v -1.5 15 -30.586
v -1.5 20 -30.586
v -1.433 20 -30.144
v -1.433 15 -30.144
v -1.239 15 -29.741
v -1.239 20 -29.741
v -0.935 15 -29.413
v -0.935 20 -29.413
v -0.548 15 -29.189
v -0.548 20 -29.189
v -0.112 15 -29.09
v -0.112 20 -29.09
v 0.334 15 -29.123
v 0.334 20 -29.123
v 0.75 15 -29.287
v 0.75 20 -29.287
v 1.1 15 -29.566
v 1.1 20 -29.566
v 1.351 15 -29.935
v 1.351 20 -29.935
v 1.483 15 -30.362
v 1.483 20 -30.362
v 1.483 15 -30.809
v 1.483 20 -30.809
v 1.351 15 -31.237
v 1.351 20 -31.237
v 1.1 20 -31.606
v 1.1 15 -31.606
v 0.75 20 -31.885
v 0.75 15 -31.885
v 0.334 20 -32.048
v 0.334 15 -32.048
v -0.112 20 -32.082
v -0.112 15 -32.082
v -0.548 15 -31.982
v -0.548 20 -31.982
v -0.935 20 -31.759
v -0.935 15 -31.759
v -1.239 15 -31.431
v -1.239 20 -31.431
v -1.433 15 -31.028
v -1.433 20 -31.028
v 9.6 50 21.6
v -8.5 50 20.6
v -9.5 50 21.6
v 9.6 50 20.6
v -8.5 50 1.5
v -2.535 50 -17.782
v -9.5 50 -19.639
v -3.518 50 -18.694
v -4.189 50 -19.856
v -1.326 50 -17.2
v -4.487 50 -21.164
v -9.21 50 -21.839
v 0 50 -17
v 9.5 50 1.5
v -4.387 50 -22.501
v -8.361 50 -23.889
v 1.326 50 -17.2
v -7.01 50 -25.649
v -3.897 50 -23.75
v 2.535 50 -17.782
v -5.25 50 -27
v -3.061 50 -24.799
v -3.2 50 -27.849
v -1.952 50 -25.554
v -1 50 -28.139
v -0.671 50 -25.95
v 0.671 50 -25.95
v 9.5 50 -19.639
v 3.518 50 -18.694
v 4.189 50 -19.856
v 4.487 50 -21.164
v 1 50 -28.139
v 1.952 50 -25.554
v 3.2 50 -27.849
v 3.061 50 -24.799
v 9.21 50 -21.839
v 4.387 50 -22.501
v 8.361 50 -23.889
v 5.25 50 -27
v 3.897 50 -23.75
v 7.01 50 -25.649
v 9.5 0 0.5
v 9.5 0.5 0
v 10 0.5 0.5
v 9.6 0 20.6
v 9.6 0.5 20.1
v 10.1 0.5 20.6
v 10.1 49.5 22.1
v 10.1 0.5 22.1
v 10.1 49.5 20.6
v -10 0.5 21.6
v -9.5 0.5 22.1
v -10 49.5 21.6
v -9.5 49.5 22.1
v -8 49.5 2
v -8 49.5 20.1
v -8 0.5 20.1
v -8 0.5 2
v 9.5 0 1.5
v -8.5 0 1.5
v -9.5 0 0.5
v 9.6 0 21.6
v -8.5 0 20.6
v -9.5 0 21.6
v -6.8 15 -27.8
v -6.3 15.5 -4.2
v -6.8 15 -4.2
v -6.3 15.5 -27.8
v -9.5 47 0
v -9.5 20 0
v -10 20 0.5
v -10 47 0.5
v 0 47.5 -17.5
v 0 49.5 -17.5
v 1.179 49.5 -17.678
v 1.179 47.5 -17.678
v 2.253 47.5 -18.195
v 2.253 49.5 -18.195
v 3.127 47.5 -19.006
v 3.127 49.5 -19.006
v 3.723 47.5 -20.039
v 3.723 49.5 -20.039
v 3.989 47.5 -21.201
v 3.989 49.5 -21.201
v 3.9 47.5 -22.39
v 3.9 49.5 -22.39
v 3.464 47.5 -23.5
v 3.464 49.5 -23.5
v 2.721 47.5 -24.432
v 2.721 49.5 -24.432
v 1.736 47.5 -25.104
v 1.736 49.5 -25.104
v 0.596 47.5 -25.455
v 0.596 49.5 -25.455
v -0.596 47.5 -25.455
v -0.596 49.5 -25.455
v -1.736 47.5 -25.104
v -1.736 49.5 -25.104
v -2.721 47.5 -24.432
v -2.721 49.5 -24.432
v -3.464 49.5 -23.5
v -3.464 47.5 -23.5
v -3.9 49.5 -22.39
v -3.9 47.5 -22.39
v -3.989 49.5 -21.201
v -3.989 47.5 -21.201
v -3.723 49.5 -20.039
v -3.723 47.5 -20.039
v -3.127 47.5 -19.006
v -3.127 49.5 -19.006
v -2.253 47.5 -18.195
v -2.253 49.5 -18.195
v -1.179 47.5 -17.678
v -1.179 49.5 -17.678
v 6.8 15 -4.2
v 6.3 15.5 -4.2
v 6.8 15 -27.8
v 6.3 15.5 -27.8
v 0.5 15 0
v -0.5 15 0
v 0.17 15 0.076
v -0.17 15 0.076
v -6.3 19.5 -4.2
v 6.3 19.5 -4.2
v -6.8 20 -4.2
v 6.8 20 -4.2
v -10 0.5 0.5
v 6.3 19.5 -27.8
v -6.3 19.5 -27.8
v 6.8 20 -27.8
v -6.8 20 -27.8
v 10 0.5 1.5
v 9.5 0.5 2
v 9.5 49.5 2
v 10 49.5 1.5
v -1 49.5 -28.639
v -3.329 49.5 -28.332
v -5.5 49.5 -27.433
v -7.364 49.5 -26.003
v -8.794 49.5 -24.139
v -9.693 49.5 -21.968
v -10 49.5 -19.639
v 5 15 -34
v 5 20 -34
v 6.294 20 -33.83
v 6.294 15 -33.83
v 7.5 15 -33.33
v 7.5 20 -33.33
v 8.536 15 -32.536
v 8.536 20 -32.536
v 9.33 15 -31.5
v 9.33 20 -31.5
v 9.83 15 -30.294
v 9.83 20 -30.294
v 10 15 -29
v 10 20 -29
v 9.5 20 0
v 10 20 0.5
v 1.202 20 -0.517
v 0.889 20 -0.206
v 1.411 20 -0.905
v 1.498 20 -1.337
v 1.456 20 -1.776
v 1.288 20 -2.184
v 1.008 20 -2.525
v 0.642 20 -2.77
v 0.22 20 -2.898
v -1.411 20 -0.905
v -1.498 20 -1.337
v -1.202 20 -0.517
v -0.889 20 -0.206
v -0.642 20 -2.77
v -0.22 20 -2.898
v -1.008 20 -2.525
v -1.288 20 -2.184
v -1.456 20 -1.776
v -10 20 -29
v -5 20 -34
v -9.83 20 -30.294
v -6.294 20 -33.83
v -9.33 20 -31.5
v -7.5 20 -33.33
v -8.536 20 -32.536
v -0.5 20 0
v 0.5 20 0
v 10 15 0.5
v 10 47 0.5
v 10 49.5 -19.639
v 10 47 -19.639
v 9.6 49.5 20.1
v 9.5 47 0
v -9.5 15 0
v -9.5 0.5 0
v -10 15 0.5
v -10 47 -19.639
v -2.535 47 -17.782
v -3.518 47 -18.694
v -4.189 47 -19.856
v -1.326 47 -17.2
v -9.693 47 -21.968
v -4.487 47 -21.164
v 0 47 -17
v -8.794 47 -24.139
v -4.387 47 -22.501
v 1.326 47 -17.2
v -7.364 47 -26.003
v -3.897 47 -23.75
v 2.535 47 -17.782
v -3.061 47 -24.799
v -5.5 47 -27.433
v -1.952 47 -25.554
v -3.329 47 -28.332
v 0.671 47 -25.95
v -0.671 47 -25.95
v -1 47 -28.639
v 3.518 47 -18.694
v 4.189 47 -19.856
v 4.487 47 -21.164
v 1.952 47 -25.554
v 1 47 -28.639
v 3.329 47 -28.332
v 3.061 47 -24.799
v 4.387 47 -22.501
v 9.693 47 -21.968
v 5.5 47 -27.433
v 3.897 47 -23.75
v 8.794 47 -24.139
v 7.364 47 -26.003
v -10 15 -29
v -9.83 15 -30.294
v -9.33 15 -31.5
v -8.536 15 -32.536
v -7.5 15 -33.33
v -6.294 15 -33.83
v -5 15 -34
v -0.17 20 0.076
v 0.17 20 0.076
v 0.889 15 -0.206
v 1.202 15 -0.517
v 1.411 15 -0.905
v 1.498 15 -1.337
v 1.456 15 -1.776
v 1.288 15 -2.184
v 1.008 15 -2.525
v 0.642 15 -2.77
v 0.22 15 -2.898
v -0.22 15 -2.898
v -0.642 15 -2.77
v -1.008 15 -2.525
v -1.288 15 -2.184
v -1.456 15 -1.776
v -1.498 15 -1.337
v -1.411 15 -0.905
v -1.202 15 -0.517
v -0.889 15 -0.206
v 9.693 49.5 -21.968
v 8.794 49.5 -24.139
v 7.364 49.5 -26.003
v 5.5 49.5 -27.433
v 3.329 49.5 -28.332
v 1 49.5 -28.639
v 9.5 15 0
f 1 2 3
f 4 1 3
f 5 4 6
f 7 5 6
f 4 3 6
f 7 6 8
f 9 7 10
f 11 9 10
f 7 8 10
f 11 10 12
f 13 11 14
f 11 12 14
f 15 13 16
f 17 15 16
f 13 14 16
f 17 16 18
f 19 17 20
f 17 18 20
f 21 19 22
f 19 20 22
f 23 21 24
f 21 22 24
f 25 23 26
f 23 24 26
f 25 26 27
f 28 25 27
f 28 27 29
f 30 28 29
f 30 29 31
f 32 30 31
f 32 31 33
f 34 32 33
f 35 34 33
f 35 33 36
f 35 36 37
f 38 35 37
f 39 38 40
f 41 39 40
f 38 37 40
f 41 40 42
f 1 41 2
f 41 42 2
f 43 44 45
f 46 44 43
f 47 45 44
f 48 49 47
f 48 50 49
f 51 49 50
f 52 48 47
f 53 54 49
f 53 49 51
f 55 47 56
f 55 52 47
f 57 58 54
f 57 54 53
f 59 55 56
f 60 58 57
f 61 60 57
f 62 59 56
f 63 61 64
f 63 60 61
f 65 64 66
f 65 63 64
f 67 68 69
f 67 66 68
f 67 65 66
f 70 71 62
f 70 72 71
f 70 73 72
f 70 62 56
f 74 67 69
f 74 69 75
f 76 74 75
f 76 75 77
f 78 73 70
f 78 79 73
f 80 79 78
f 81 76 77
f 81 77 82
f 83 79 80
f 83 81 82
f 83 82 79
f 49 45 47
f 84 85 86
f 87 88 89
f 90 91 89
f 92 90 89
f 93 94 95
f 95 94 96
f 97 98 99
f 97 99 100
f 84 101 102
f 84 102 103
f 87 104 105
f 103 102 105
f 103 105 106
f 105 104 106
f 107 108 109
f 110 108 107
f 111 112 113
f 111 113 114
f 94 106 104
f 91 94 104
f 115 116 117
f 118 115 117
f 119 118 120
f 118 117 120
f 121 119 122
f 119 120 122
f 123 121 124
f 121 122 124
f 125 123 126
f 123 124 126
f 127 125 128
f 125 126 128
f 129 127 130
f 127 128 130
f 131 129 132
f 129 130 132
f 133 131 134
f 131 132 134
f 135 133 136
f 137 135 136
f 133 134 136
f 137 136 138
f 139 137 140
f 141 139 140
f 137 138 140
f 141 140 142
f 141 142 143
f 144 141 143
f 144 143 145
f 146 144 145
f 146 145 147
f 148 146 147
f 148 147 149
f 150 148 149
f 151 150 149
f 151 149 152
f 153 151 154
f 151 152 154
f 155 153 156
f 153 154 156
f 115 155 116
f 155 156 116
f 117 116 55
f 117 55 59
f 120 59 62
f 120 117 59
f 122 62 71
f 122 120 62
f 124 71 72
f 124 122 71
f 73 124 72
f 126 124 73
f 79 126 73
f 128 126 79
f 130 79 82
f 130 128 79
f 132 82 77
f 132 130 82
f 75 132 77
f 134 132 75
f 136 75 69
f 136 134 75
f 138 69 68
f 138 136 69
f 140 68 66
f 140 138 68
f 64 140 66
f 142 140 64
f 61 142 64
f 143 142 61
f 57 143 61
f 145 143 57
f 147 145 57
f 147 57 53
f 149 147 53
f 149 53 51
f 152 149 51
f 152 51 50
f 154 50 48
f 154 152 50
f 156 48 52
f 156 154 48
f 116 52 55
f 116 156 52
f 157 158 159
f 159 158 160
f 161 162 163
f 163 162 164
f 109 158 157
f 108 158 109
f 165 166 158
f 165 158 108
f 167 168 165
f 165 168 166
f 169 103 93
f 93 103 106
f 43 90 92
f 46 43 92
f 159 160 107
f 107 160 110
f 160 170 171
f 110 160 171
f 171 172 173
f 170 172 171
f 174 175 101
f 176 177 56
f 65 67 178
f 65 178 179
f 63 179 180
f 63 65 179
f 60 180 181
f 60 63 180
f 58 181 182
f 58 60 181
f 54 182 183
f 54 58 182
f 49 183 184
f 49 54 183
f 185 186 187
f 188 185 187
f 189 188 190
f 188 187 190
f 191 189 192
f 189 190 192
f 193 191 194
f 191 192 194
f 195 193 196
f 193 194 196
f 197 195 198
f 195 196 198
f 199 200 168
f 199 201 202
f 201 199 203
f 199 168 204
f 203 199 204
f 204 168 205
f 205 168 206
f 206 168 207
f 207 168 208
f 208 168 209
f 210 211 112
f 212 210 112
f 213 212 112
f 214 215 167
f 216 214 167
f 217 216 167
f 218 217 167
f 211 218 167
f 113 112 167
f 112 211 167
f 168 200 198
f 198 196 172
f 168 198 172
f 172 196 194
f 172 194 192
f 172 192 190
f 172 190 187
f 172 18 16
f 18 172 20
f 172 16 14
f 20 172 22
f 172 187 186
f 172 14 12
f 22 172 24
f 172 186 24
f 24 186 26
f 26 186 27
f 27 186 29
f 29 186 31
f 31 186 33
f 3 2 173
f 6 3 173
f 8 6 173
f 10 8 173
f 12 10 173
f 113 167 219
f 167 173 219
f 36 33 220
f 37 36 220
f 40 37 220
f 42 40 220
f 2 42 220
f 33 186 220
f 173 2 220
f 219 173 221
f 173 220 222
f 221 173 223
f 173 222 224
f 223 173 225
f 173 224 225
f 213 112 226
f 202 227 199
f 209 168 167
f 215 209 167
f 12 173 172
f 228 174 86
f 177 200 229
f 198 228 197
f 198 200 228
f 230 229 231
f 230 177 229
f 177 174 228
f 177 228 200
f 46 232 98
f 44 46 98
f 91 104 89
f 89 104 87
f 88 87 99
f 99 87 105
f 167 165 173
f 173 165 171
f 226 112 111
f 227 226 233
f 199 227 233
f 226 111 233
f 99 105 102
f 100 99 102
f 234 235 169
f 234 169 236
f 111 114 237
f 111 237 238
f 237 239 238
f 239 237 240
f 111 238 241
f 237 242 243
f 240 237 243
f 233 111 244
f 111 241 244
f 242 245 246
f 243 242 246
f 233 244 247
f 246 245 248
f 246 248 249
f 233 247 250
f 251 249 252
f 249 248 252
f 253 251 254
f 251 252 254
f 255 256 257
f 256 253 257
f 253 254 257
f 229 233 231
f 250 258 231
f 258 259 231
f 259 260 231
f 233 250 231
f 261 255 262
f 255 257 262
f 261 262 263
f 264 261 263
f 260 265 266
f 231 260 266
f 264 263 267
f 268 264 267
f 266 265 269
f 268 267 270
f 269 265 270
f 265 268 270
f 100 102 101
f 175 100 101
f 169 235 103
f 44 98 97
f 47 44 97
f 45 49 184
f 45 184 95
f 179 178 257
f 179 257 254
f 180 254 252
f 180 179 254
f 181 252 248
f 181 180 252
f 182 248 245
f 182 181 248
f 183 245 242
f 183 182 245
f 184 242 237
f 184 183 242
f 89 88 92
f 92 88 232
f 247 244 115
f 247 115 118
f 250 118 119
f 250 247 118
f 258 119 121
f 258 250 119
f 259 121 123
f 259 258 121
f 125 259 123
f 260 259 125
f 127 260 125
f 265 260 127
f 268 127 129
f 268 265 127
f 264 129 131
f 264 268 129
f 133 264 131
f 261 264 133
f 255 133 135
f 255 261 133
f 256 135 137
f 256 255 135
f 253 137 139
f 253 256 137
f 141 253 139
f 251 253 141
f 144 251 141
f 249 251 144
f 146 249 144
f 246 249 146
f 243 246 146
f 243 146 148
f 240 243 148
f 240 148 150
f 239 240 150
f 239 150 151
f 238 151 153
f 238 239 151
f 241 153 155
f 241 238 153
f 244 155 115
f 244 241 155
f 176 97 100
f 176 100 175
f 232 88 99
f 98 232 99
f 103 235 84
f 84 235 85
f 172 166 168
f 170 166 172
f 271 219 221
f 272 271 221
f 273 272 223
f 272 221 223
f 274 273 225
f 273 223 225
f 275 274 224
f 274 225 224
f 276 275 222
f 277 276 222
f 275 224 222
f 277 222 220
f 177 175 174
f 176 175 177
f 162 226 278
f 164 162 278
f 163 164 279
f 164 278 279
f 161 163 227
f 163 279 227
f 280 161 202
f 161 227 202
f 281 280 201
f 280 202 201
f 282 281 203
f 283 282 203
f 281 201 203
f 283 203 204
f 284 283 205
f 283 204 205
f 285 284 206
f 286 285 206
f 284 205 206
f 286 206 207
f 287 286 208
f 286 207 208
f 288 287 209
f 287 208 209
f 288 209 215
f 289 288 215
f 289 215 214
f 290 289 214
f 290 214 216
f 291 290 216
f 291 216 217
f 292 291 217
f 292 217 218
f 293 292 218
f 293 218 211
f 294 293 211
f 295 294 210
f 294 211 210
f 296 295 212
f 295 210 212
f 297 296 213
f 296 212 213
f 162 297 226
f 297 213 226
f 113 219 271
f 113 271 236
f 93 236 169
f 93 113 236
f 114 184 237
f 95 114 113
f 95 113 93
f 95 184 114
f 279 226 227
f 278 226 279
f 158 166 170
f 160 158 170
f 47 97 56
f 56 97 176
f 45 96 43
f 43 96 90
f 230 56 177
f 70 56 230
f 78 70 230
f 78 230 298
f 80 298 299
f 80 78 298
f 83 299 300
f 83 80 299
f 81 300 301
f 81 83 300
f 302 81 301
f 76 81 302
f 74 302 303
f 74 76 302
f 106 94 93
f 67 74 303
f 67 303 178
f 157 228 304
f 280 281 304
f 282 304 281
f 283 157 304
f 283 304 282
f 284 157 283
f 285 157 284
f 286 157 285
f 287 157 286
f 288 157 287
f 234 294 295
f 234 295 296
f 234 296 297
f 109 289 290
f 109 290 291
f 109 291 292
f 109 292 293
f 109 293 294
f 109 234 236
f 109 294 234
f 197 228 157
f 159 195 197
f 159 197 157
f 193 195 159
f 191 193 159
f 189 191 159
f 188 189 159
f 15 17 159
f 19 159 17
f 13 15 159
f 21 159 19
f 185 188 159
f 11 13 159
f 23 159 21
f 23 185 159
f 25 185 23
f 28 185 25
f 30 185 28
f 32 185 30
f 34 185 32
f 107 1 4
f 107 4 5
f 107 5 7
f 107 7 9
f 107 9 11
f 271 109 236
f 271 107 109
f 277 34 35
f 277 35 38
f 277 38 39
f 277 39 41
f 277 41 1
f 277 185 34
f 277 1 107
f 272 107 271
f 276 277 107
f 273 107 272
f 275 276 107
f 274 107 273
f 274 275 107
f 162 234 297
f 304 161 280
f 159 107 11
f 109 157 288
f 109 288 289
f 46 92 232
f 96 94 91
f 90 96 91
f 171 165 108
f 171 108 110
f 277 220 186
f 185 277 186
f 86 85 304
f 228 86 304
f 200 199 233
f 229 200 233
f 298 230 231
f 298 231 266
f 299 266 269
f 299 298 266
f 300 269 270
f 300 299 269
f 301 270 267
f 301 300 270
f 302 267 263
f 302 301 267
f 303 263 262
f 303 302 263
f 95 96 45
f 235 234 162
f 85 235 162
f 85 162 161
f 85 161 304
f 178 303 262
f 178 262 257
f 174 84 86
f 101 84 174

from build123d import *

# Parameters (mm, degrees)
SKETCH1_W           = 20
SKETCH1_H           = 50
BOSS_EXTRUDE1_DEPTH = 2
BOSS_EXTRUDE2_DEPTH = 50
SKETCH3_R           = 4
BOSS_EXTRUDE3_DEPTH = 3
SKETCH4_W           = 12.6
SKETCH4_H           = 23.6
BOSS_EXTRUDE4_DEPTH = 5
CHAMFER1_SIZE       = 0.5
CHAMFER2_SIZE       = 0.5
SKETCH5_R           = 1.5
CUT_EXTRUDE1_DEPTH  = 5


with BuildPart() as part:
    # Sketch1 → Boss-Extrude1 (new body)
    with BuildSketch(Plane.XY):
        with Locations((0, 25)):
            Rectangle(SKETCH1_W, SKETCH1_H)
    extrude(amount=BOSS_EXTRUDE1_DEPTH)

    # Sketch2 → Boss-Extrude2 (add)
    with BuildSketch(Plane.XZ):
        Polygon((-10, 2), (-10, 22.1), (10.1, 22.1), (10.1, 20.1), (-8, 20.1), (-8, 2), align=None)
    extrude(amount=-BOSS_EXTRUDE2_DEPTH)

    # Sketch3 → Boss-Extrude3 (add)
    with BuildSketch(Plane(origin=(0, 50, 0), x_dir=(1, 0, 0), z_dir=(0, 1, 0))):
        with BuildLine():
            Line((1, 28.638755942), (-1, 28.638755942))
            ThreePointArc((-1, 28.638755942), (-7.363961031, 26.002716972), (-10, 19.638755942))
            Line((-10, 19.638755942), (-10, 0))
            Line((-10, 0), (10, 0))
            Line((10, 0), (10, 19.638755942))
            ThreePointArc((10, 19.638755942), (7.363961031, 26.002716972), (1, 28.638755942))
        make_face()
        with Locations(Location((0, 21.5, 0), (0, 0, 270))):
            Circle(SKETCH3_R, mode=Mode.SUBTRACT)
    extrude(amount=-BOSS_EXTRUDE3_DEPTH)

    # Sketch4 → Boss-Extrude4 (add)
    with BuildSketch(Plane(origin=(0, 20, 0), x_dir=(-1, 0, 0), z_dir=(0, -1, 0))):
        with BuildLine():
            Line((-10, 0), (10, 0))
            Line((10, 0), (10, 29))
            ThreePointArc((10, 29), (8.535533906, 32.535533906), (5, 34))
            Line((5, 34), (-5, 34))
            ThreePointArc((-5, 34), (-8.535533906, 32.535533906), (-10, 29))
            Line((-10, 29), (-10, 0))
        make_face()
        with Locations((0, 16)):
            Rectangle(SKETCH4_W, SKETCH4_H, mode=Mode.SUBTRACT)
    extrude(amount=BOSS_EXTRUDE4_DEPTH)

    # Chamfer1
    chamfer1_edges = [part.edges().sort_by_distance(p)[0] for p in [
        (1, 0, 2),
        (-10, 25, 22.1),
        (10.1, 25, 20.1),
        (-8, 0, 11.05),
        (1.05, 0, 20.1),
        (10.1, 0, 21.1),
        (0.05, 0, 22.1),
        (0.05, 50, 22.1),
        (10.1, 50, 21.1),
        (1.05, 50, 20.1),
        (-8, 50, 11.05),
        (-10, 33.5, 0),
        (0, 50, -25.5),
        (0, 50, -28.638755942),
        (-7.363961031, 50, -26.002716972),
        (7.363961031, 50, -26.002716972),
        (10, 25, 2),
        (0, 0, 0),
        (-10, 7.5, 0),
        (10, 33.5, 0),
        (6.3, 20, -16),
        (-6.3, 20, -16),
        (6.3, 15, -16),
        (10, 7.5, 0),
        (-6.3, 15, -16),
        (1, 50, 2),
        (10, 0, 1),
        (-10, 0, 11.05),
        (-10, 50, 1.230622029),
        (10, 50, -8.819377971),
    ]]
    chamfer(chamfer1_edges, length=CHAMFER1_SIZE)

    # Chamfer2
    chamfer2_edges = [part.edges().sort_by_distance(p)[0] for p in [
        (0, 47, -25.5),
    ]]
    chamfer(chamfer2_edges, length=CHAMFER2_SIZE)

    # Sketch5 → Cut-Extrude1 (cut)
    with BuildSketch(Plane(origin=(0, 20, 0), x_dir=(1, 0, 0), z_dir=(0, 1, 0))):
        with Locations(Location((0, 30.585786438, 0), (0, 0, 180))):
            Circle(SKETCH5_R)
        with Locations(Location((0, 1.414213562, 0), (0, 0, 250.528779366))):
            Circle(SKETCH5_R)
    extrude(amount=-CUT_EXTRUDE1_DEPTH, mode=Mode.SUBTRACT)


solid = part.part
